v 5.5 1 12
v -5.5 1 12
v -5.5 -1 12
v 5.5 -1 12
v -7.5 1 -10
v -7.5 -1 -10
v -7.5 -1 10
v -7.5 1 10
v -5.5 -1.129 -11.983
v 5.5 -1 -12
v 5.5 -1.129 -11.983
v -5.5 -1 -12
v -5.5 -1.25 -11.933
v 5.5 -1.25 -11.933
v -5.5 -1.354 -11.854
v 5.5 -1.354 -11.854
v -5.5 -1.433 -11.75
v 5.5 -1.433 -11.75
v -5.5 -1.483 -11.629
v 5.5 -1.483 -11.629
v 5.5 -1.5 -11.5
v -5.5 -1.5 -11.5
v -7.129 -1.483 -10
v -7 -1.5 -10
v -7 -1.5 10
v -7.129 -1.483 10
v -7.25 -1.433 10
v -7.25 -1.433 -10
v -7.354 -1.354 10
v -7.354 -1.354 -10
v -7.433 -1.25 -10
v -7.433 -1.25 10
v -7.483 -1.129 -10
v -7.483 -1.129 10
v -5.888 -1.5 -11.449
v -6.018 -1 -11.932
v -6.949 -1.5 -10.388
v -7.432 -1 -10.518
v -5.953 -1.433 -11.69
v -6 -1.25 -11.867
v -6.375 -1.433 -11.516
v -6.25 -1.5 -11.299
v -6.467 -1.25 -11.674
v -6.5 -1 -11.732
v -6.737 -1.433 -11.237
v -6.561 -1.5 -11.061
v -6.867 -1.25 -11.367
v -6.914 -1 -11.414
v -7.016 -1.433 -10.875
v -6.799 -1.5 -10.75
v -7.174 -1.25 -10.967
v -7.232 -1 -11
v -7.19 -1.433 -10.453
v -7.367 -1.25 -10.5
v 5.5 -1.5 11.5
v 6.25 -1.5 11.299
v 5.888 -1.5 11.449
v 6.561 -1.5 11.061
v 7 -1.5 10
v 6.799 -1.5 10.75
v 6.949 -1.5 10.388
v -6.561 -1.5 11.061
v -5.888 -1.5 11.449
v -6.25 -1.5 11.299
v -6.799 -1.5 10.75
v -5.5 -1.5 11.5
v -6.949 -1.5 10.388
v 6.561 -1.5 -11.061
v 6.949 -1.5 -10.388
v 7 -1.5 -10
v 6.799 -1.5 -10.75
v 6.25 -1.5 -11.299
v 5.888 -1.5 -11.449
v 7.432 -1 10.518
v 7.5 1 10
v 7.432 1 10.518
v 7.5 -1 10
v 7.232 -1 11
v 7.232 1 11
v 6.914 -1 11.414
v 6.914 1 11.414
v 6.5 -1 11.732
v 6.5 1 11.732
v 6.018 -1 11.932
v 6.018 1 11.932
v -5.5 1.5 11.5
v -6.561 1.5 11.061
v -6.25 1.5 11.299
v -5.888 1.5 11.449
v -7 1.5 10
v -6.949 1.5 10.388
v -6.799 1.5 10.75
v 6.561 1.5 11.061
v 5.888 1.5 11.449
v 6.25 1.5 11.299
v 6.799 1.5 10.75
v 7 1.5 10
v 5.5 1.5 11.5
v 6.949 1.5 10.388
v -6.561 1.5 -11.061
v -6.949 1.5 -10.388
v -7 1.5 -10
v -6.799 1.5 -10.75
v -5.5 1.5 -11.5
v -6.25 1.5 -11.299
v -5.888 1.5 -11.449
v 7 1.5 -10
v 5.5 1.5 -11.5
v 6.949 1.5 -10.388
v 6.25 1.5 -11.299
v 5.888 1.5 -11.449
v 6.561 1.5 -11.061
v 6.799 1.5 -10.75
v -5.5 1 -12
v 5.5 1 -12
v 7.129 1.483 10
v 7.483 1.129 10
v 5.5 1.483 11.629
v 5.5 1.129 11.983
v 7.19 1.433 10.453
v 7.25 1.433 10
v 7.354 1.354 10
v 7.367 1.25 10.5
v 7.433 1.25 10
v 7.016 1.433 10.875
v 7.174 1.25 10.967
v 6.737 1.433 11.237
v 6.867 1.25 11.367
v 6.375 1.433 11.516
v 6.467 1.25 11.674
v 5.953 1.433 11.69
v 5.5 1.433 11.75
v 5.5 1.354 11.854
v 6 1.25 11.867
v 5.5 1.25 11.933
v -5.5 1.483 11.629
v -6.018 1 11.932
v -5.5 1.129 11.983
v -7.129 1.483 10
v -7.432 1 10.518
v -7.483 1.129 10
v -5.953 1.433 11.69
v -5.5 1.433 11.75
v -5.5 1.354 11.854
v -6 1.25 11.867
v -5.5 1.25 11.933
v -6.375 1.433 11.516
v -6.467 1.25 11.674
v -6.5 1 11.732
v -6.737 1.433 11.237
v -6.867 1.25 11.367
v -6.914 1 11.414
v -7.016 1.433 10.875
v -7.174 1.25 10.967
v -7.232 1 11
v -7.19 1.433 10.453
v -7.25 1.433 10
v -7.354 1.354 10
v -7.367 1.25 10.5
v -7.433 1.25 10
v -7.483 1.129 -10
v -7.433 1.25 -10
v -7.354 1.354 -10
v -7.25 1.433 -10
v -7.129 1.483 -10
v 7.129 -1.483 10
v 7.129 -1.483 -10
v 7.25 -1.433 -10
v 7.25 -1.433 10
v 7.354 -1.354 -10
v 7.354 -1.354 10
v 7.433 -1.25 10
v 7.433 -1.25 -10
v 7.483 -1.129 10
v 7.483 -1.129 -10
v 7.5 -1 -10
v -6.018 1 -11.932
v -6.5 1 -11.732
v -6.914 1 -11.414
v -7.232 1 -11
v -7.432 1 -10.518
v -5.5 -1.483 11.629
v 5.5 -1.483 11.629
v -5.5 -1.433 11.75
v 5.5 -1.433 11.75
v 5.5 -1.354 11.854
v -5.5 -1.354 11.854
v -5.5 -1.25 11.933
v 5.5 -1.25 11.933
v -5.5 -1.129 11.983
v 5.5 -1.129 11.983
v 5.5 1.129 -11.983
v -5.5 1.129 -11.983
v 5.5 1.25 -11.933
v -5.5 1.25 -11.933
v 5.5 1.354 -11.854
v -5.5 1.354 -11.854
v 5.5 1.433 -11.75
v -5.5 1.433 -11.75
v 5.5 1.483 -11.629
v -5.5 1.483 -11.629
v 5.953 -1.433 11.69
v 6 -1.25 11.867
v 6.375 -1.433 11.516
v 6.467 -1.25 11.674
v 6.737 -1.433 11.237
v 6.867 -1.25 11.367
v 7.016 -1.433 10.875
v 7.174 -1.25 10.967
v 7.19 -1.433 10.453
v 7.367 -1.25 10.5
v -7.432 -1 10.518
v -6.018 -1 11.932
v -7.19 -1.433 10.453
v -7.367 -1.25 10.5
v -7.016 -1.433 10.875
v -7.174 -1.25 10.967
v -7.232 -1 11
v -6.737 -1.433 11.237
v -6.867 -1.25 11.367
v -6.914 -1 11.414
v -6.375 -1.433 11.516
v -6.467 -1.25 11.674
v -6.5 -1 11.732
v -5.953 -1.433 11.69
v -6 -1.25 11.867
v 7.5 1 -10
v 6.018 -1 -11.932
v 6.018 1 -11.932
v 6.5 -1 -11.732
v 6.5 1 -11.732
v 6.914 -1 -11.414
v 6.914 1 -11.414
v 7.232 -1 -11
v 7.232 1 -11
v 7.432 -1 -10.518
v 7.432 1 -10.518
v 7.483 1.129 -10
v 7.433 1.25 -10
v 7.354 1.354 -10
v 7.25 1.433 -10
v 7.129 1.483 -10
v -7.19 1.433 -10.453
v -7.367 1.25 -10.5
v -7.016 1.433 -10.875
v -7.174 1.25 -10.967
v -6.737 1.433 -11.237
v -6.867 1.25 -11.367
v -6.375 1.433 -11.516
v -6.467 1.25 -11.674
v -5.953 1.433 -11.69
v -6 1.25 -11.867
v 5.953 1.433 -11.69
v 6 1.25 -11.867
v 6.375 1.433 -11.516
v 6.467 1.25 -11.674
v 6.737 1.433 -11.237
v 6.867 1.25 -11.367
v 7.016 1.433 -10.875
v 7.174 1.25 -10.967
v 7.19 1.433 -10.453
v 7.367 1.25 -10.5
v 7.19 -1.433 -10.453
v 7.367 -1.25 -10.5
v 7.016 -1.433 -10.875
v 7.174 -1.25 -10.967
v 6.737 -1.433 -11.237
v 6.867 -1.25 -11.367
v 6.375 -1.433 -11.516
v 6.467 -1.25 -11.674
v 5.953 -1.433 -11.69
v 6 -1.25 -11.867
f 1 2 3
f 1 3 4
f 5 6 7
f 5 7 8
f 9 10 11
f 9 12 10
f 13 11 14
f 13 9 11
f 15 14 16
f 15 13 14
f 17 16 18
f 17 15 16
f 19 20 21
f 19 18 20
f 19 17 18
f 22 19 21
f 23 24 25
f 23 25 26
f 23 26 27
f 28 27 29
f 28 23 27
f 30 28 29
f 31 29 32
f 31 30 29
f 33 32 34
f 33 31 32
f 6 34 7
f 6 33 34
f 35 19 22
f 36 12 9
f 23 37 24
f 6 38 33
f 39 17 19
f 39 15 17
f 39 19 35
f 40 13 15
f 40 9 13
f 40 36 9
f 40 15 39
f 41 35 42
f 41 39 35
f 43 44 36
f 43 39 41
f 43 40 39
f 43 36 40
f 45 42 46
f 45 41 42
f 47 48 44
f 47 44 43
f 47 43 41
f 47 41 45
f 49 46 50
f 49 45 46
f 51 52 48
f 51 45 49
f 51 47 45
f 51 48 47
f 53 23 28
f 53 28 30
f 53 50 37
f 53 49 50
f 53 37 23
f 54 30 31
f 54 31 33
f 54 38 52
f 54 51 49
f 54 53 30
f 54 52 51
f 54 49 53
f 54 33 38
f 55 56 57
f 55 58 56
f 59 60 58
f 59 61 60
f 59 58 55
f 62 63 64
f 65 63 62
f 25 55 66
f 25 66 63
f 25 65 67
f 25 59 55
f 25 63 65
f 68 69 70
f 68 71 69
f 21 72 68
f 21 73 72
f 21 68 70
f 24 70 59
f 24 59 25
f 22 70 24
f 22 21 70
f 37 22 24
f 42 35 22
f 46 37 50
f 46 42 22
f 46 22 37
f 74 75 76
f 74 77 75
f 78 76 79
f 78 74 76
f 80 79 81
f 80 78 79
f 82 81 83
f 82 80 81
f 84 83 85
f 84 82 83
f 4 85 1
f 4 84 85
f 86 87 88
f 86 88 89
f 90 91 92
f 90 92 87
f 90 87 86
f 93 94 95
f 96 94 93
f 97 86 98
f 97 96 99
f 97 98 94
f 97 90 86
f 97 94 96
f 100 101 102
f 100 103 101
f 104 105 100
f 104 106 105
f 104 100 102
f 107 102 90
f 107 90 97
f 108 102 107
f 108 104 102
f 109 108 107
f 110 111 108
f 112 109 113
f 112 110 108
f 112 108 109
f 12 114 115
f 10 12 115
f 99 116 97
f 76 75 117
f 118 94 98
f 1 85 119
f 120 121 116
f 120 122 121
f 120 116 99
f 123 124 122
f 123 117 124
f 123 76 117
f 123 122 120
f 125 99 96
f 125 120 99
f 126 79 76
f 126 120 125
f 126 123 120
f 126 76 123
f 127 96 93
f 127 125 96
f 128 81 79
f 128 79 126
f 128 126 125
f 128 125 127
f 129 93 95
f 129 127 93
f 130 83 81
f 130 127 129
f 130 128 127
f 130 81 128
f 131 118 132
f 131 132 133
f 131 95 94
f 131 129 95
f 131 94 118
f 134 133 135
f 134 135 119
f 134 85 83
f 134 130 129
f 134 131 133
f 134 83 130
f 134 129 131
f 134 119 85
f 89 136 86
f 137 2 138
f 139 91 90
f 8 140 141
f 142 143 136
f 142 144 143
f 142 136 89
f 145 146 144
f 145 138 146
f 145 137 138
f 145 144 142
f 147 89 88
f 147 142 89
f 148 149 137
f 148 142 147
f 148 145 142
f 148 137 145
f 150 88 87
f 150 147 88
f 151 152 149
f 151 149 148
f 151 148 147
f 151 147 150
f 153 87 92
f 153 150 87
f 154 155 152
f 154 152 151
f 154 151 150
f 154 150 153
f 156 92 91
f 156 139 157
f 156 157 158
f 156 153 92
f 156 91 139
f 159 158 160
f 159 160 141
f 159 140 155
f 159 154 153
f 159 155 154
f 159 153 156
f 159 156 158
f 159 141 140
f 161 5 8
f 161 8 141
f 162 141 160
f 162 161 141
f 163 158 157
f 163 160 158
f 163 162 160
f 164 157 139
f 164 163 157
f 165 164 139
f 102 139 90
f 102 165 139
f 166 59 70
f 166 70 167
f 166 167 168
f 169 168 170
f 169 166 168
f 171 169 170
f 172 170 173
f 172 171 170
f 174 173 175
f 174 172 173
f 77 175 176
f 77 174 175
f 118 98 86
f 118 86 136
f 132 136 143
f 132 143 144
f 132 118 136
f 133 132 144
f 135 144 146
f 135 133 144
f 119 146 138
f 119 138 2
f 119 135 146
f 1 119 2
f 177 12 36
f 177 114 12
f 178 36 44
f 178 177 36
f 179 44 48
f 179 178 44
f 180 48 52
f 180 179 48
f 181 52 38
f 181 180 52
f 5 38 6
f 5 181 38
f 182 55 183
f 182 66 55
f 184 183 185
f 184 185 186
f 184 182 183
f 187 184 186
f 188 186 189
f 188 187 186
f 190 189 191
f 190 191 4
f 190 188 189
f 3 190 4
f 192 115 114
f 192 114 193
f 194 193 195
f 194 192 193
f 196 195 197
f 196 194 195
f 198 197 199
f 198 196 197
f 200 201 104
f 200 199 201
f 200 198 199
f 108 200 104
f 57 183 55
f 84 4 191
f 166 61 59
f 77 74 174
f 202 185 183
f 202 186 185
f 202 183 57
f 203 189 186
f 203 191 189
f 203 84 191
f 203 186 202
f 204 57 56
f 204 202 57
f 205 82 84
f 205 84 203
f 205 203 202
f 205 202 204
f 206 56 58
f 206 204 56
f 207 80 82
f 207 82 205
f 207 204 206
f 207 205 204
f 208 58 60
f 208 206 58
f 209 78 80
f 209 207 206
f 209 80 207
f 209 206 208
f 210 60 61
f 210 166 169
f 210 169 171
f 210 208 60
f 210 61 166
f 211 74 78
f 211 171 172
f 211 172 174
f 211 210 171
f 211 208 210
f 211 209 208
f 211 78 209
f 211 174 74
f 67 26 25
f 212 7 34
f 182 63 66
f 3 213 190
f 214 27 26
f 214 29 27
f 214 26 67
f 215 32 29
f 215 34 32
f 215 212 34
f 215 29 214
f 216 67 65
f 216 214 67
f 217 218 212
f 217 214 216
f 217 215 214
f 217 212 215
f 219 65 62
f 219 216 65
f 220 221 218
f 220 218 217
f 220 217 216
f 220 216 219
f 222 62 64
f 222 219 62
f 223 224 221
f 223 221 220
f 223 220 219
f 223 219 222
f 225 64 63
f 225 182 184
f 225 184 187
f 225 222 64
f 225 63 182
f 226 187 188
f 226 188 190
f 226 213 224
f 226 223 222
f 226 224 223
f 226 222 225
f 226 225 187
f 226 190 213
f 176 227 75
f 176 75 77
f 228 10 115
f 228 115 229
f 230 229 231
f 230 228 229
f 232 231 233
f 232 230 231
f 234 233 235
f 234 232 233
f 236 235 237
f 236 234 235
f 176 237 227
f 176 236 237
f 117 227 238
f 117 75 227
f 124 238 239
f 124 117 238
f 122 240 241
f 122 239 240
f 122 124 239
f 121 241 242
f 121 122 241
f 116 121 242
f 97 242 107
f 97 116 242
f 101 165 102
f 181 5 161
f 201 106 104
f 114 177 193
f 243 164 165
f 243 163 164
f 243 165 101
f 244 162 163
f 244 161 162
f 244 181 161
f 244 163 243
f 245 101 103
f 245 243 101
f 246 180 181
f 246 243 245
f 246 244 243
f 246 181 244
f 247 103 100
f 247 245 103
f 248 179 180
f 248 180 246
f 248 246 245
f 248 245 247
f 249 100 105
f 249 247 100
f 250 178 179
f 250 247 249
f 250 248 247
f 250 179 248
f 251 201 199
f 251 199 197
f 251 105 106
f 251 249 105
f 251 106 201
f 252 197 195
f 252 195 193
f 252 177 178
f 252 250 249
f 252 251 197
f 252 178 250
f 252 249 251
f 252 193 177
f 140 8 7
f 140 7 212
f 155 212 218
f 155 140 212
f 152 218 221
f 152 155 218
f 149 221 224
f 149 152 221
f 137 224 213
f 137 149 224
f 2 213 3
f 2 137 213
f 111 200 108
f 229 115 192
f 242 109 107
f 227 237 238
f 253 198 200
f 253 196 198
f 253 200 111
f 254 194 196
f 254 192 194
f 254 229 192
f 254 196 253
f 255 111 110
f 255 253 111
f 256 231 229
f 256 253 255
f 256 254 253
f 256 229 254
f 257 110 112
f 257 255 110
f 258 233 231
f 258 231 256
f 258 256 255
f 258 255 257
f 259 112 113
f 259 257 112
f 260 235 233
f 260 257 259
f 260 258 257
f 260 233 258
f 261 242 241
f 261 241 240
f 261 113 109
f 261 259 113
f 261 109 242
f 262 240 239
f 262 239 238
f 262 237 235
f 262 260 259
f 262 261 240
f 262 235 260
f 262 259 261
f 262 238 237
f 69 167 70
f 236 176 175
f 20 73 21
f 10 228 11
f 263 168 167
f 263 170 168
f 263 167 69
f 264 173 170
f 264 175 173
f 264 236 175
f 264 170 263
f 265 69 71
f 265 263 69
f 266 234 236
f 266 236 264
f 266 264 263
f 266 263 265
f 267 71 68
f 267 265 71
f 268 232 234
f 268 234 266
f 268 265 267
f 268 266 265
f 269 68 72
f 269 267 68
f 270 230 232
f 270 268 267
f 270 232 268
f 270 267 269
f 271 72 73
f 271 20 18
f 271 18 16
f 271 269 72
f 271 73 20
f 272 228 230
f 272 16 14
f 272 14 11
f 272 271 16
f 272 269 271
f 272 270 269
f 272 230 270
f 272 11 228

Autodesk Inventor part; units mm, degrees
ref_plane "YZ Plane" through (0, 0, 0) normal (1, 0, 0) x (0, 1, 0)
ref_plane "XZ Plane" through (0, 0, 0) normal (0, 1, 0) x (-1, 0, 0)
ref_plane "XY Plane" through (0, 0, 0) normal (0, 0, 1) x (1, 0, 0)
sketch "Sketch1" plane through (0, 0, 0) normal (0, 0, 1) x (1, 0, 0)
  line L0 (7.5, -1.5) -> (-7.5, -1.5)
  line L1 (-7.5, -1.5) -> (-7.5, 1.5)
  line L2 (-7.5, 1.5) -> (7.5, 1.5)
  line L3 (7.5, 1.5) -> (7.5, -1.5)
  line L4 (7.5, -1.5) -> (-7.5, 1.5) construction
  line L5 (-7.5, -1.5) -> (7.5, 1.5) construction
  point P0 (0, 0)
  dimension "d0" = 15
  dimension "d1" = 3
extrude "Extrusion1" add sketch "Sketch1" along normal mid plane 24
fillet "Fillet1" radius 2 4 edges at (7.5, 0, 12) (-7.5, 0, 12) (-7.5, 0, -12) (7.5, 0, -12)
fillet "Fillet1" radius 0.5 8 edges at (-7.5, 1.5, 0) (0, 1.5, -12) (7.5, 1.5, 0) (0, 1.5, 12) (0, -1.5, 12) (7.5, -1.5, 0) (0, -1.5, -12) (-7.5, -1.5, 0)
properties part number "6AESC" material "Steel"
